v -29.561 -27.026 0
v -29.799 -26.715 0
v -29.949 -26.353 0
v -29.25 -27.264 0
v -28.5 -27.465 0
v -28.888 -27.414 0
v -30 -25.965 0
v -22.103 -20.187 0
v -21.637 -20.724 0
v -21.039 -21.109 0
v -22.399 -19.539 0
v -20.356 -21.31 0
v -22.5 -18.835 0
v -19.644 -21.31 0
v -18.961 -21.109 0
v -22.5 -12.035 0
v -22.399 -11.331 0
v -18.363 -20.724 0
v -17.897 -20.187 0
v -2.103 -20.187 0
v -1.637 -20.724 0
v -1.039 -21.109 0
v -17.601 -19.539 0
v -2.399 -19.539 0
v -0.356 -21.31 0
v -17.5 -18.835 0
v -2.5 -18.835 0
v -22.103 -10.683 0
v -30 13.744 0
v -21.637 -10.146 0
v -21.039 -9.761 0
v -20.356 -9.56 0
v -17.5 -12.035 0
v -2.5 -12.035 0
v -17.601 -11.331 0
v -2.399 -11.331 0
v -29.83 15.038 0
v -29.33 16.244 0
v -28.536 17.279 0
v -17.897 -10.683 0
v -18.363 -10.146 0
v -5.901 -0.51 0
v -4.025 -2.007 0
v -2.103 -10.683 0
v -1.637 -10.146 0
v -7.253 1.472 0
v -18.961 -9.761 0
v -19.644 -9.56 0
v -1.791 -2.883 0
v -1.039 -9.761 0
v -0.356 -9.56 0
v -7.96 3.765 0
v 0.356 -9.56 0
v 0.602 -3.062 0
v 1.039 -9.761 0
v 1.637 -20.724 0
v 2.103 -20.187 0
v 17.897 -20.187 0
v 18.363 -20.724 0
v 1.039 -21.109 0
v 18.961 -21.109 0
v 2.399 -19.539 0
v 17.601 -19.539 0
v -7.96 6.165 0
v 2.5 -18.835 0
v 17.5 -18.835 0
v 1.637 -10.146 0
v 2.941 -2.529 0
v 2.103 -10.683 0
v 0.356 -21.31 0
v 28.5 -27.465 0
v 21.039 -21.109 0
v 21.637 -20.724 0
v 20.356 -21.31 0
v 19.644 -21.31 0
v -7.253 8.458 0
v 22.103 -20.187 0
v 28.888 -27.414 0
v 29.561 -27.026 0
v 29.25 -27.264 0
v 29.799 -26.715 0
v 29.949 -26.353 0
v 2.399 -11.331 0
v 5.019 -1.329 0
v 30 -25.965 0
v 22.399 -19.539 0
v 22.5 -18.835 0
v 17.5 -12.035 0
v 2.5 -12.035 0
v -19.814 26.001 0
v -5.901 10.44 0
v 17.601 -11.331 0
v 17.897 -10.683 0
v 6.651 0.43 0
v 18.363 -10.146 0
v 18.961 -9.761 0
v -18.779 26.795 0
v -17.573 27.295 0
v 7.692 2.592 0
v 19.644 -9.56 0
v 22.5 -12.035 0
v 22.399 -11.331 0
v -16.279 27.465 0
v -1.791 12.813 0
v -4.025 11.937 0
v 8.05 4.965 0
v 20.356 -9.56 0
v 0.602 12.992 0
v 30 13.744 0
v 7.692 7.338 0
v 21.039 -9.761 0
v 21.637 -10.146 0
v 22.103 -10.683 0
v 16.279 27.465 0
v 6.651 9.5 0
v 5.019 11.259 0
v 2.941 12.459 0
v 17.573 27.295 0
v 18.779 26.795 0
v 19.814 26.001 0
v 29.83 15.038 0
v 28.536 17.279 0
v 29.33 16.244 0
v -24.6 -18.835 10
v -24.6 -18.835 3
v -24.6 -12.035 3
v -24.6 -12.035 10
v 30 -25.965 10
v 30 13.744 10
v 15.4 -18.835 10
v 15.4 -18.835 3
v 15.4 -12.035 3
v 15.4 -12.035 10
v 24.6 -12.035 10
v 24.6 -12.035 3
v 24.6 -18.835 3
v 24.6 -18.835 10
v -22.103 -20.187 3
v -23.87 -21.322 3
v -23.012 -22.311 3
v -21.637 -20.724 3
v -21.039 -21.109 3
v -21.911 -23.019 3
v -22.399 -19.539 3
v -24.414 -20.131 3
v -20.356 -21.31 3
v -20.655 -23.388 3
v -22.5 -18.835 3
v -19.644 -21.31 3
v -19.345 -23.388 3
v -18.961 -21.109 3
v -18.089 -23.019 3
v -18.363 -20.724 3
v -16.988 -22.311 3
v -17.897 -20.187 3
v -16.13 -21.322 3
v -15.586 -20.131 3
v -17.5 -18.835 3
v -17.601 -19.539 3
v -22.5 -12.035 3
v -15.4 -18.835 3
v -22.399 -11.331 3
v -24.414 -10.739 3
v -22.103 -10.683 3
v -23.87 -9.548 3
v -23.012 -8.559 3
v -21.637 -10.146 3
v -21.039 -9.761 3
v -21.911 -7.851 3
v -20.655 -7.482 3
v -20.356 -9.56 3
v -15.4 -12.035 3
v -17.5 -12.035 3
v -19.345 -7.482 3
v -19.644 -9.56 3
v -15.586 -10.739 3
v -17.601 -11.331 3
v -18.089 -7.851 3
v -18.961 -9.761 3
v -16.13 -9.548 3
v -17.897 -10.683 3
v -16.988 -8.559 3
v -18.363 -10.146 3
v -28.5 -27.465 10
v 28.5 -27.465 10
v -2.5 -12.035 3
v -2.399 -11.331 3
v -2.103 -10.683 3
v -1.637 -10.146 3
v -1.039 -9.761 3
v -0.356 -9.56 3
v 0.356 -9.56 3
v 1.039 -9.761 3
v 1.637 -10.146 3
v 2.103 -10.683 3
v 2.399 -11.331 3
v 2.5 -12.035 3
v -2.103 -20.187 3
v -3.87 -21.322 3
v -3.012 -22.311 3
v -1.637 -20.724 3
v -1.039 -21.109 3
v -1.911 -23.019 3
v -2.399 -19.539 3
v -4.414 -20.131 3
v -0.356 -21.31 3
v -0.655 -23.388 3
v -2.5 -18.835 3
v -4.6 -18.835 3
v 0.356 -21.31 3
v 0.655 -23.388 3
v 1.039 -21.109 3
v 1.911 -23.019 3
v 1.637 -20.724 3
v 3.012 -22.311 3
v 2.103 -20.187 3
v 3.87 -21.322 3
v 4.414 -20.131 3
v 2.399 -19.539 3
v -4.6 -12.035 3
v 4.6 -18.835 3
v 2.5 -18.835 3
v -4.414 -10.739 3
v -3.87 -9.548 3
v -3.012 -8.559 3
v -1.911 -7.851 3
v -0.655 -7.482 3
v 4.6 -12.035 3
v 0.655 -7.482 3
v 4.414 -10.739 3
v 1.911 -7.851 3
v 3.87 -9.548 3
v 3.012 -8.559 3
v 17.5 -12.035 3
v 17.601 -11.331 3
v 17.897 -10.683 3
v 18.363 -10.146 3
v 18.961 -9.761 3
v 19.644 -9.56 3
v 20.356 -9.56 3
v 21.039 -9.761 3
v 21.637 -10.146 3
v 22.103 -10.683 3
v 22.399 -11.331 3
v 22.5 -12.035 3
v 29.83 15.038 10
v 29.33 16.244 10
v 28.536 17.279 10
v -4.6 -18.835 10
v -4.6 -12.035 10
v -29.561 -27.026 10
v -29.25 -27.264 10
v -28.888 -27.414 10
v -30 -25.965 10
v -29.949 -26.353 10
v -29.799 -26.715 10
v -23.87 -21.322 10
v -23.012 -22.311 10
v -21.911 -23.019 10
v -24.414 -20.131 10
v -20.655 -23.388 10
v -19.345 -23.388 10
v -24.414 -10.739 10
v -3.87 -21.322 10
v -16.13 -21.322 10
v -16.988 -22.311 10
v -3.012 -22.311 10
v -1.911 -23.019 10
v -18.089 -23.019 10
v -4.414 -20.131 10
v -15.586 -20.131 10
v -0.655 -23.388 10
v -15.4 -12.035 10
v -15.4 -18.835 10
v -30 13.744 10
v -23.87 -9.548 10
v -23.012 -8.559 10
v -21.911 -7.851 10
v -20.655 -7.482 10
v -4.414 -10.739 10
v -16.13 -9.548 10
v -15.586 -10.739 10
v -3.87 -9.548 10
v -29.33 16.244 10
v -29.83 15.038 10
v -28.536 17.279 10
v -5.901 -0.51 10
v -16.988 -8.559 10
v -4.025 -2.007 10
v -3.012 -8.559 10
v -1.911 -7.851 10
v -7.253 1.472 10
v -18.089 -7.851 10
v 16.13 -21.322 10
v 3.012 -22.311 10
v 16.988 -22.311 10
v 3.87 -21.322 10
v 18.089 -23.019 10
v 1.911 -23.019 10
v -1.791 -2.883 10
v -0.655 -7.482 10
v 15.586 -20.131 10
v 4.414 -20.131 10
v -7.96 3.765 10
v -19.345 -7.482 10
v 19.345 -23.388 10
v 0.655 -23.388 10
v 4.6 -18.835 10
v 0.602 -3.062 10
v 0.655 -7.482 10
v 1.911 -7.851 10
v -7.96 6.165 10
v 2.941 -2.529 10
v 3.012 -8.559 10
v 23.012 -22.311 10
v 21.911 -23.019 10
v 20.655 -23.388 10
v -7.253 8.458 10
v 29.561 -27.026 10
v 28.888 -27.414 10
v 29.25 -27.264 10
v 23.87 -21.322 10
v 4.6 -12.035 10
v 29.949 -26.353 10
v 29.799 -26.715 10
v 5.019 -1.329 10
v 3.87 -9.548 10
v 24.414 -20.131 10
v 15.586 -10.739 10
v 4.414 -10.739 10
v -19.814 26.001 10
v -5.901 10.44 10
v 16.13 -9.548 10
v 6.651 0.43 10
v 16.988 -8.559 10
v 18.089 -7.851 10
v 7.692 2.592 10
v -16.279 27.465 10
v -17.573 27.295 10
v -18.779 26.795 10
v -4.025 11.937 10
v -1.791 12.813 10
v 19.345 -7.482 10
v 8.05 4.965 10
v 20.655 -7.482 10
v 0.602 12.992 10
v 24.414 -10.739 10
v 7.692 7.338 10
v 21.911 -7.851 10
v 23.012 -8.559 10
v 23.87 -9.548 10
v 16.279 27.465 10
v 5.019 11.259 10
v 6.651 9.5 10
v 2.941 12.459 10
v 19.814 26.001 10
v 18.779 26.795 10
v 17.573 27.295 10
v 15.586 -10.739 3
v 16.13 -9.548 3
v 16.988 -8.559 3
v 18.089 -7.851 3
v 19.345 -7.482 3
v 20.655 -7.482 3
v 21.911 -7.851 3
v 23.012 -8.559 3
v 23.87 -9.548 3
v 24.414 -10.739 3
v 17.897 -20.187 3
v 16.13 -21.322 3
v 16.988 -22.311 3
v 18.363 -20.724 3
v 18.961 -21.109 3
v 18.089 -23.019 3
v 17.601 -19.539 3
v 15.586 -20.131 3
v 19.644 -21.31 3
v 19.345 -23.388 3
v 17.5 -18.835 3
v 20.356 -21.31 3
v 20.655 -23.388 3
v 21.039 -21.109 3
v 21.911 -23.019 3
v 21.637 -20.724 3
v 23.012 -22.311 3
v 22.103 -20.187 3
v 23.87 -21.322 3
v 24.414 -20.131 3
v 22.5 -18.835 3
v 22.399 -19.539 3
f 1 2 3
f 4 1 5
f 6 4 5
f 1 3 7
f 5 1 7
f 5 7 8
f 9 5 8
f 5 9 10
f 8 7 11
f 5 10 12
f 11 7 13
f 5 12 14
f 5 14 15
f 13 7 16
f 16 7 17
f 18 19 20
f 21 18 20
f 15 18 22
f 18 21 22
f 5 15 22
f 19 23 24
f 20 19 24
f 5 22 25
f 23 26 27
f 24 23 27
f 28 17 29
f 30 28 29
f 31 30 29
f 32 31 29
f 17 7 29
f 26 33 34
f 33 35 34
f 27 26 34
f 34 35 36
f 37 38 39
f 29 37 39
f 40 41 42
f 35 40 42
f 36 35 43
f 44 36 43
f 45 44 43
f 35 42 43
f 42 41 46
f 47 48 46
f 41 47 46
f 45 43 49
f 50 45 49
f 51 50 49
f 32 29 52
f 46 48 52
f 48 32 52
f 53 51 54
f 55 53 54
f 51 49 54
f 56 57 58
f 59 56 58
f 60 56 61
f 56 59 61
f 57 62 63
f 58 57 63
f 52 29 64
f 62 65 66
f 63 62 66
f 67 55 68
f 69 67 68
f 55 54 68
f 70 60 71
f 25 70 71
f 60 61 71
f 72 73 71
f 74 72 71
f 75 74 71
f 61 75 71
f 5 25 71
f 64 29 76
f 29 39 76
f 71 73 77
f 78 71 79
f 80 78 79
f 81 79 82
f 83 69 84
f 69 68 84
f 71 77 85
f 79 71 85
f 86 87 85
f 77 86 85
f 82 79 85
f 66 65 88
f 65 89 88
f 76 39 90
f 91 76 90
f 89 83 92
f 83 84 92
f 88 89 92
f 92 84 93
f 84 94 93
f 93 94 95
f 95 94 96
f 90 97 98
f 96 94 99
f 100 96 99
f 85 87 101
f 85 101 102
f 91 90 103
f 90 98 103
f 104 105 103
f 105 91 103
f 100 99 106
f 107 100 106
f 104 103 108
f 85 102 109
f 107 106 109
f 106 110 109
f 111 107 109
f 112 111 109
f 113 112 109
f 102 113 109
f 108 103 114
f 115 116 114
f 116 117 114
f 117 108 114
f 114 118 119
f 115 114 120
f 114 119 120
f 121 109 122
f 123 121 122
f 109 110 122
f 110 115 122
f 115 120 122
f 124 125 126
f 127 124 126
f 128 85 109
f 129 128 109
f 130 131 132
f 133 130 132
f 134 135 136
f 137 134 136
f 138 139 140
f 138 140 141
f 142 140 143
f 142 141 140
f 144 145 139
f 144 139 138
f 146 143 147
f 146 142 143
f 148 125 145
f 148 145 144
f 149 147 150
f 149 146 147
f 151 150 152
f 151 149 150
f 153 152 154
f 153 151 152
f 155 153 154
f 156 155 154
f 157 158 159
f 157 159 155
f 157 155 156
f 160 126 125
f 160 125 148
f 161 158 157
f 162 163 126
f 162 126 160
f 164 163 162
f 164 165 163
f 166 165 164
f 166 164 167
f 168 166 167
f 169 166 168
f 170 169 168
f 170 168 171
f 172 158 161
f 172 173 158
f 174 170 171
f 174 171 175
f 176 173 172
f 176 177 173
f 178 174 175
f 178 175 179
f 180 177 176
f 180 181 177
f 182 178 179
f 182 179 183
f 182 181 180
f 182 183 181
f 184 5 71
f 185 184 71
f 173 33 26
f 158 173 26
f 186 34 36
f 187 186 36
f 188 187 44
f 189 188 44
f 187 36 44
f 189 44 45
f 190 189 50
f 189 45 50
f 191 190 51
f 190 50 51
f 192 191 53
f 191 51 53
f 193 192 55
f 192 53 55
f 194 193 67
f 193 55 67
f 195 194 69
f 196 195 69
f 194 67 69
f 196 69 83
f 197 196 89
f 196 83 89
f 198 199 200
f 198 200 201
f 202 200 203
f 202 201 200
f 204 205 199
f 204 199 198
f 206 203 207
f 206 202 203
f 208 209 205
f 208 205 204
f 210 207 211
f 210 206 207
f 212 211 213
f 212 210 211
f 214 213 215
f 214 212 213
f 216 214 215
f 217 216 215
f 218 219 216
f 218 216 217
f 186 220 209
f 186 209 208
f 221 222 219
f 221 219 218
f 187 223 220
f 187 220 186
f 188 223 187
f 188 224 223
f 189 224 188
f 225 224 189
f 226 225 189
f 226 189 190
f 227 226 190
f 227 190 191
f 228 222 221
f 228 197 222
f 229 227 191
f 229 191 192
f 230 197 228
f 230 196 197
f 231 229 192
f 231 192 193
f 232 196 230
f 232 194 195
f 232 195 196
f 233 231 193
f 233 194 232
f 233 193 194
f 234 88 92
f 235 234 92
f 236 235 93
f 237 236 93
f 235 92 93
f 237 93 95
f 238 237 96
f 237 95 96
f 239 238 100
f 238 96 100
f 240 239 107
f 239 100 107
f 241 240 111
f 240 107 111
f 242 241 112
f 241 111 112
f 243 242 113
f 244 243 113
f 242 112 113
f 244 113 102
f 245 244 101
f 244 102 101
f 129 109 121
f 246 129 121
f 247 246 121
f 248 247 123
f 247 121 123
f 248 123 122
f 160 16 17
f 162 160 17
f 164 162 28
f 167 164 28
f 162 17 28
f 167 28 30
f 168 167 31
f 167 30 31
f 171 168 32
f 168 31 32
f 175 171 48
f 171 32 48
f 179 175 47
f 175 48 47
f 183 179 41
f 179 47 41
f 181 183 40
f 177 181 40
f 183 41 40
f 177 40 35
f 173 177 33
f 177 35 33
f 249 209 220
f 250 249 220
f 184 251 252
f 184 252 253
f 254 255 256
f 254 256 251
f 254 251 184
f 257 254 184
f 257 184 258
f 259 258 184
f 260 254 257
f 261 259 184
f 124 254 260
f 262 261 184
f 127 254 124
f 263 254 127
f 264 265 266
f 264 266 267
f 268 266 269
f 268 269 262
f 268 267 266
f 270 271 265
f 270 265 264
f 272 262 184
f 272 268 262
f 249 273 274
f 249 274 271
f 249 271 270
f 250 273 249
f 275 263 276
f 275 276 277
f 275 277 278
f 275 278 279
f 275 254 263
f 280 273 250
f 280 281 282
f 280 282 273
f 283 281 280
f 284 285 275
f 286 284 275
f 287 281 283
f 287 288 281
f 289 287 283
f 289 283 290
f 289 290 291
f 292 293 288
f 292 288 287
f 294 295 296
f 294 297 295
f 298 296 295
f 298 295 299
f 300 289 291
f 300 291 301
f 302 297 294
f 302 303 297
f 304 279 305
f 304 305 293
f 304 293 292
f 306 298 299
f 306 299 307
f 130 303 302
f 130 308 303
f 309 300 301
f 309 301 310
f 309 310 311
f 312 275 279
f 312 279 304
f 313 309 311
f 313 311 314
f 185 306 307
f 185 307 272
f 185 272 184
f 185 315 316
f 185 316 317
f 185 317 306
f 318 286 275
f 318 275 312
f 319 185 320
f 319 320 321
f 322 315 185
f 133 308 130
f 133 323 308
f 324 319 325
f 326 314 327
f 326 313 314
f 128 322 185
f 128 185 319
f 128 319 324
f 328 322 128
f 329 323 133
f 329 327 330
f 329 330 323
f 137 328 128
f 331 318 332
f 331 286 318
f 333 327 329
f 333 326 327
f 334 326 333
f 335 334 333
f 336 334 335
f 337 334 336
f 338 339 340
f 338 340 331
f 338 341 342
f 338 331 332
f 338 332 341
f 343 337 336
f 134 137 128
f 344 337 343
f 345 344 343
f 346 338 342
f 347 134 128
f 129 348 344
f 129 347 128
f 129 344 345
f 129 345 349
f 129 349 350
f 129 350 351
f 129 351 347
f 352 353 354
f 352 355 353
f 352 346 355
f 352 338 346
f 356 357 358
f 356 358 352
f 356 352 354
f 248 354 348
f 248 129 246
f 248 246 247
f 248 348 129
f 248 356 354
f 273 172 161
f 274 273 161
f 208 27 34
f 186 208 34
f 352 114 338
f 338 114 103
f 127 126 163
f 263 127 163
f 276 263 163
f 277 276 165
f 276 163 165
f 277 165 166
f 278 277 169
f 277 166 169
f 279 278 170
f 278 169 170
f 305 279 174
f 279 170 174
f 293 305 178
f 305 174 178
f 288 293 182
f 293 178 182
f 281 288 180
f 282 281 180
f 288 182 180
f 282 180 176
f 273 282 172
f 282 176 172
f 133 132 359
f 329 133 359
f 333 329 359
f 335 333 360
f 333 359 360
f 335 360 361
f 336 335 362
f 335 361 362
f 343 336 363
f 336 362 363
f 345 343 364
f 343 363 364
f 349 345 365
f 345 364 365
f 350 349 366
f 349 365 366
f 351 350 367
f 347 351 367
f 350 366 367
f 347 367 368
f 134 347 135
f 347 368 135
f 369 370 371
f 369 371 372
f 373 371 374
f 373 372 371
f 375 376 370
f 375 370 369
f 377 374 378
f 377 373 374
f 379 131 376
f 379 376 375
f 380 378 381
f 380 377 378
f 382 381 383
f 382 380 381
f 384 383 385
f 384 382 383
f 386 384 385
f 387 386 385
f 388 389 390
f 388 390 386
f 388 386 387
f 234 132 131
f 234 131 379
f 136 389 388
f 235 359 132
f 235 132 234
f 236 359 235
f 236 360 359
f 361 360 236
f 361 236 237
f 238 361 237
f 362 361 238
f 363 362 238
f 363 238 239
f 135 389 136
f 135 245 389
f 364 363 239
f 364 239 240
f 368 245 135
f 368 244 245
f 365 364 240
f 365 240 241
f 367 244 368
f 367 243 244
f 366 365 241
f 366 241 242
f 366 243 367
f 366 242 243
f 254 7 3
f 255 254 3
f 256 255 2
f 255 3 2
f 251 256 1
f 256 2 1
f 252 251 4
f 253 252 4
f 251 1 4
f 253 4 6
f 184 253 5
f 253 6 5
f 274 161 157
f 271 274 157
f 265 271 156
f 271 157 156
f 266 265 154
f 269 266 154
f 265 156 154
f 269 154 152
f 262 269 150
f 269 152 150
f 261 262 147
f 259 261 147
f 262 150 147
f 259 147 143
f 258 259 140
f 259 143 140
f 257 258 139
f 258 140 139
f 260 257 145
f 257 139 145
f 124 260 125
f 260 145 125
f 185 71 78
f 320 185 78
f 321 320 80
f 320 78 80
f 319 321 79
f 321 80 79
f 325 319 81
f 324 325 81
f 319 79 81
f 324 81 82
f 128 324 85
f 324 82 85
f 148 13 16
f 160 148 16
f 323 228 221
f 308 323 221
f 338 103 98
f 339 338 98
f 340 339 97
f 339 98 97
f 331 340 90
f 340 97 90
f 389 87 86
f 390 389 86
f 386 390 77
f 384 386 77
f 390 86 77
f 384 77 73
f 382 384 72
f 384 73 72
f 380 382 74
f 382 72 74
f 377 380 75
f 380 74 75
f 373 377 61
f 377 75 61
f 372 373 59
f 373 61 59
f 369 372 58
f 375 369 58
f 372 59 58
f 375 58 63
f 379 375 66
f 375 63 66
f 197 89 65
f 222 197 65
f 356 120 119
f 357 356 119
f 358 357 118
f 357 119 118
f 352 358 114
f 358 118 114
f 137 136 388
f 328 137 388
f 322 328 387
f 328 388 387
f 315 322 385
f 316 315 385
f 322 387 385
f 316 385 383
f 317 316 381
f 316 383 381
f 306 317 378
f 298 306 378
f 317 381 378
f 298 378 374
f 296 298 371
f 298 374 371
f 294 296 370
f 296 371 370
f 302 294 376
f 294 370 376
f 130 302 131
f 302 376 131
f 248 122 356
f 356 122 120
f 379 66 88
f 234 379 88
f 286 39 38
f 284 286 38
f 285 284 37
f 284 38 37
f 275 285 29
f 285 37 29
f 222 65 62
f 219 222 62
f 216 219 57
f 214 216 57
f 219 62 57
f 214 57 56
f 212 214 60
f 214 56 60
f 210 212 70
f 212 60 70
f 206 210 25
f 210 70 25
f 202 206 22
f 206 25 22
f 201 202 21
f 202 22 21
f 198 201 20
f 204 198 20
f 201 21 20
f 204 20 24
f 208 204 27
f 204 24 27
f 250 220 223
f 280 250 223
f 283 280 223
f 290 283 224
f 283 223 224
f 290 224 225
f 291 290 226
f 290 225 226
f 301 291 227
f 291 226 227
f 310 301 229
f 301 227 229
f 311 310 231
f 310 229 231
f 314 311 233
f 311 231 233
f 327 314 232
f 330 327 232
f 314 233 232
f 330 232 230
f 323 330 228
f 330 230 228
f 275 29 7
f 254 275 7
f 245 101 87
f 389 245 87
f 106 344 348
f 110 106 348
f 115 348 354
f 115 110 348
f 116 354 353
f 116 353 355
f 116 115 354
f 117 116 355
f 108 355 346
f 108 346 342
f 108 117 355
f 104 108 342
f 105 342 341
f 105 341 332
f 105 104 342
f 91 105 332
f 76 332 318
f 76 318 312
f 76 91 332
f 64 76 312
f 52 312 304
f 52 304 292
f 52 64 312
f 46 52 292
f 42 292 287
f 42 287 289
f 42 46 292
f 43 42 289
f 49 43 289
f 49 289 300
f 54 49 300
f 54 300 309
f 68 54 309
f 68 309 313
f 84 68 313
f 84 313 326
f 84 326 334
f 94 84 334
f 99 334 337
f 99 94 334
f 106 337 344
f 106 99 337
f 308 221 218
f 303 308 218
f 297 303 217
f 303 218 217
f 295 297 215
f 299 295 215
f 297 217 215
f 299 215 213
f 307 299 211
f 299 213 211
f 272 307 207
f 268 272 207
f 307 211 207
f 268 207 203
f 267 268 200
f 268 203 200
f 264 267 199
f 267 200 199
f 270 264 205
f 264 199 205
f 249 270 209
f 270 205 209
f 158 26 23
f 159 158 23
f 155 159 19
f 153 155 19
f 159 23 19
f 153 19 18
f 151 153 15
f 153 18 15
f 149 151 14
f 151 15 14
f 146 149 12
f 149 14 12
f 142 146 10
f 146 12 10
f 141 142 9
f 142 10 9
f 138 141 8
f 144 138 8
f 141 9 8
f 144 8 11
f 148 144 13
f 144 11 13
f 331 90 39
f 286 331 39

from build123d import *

# Parameters (mm, degrees)
F0_R     = 8.05
F1_DEPTH = 10
F2_DEPTH = 3


# Not quite as in the source:
# - ends of sketch curves that miss each other by under 0.0002 mm in the source are joined


with BuildPart() as f1:
    # F0 (on Top) → F1 (new body)
    with BuildSketch(Plane.XY):
        with BuildLine():
            ThreePointArc((-16.278933, 27.465), (-18.1923501618, 27.0843976626), (-19.8144669059, 26.0005339059))
            Line((-19.8144669059, 26.0005339059), (-28.535534, 17.279466))
            ThreePointArc((-28.535534, 17.279466), (-29.6193976626, 15.6573491618), (-30, 13.743932))
            Line((-30, 13.743932), (-30, -25.965))
            ThreePointArc((-30, -25.965), (-29.5606601718, -27.0256601718), (-28.5, -27.465))
            Line((-28.5, -27.465), (28.5, -27.465))
            ThreePointArc((28.5, -27.465), (29.5606601718, -27.0256601718), (30, -25.965))
            Line((30, -25.965), (30, 13.743932))
            ThreePointArc((30, 13.743932), (29.6193976626, 15.6573491618), (28.5355339059, 17.2794659059))
            Line((28.5355339059, 17.2794659059), (19.814466, 26.000533))
            ThreePointArc((19.814466, 26.000533), (18.1923494885, 27.0843975273), (16.278932, 27.465))
            Line((16.278932, 27.465), (-16.278933, 27.465))
        make_face()
        with BuildLine():
            ThreePointArc((-24.6, -12.035), (-20, -7.435), (-15.4, -12.035))
            Line((-15.4, -12.035), (-15.4, -18.835))
            ThreePointArc((-15.4, -18.835), (-20, -23.435), (-24.6, -18.835))
            Line((-24.6, -18.835), (-24.6, -12.035))
        make_face(mode=Mode.SUBTRACT)
        with BuildLine():
            ThreePointArc((4.6, -18.835), (0, -23.435), (-4.6, -18.835))
            Line((-4.6, -18.835), (-4.6, -12.035))
            ThreePointArc((-4.6, -12.035), (0, -7.435), (4.6, -12.035))
            Line((4.6, -12.035), (4.6, -18.835))
        make_face(mode=Mode.SUBTRACT)
        with BuildLine():
            ThreePointArc((15.4, -12.035), (20, -7.435), (24.6, -12.035))
            Line((24.6, -12.035), (24.6, -18.835))
            ThreePointArc((24.6, -18.835), (20, -23.435), (15.4, -18.835))
            Line((15.4, -18.835), (15.4, -12.035))
        make_face(mode=Mode.SUBTRACT)
        with Locations((0, 4.965)):
            Circle(F0_R, mode=Mode.SUBTRACT)
    extrude(amount=F1_DEPTH)

    # F0 (on Top) → F2 (join)
    with BuildSketch(Plane.XY):
        with BuildLine():
            Line((-15.4, -18.835), (-15.4, -12.035))
            ThreePointArc((-15.4, -12.035), (-20, -7.435), (-24.6, -12.035))
            Line((-24.6, -12.035), (-24.6, -18.835))
            ThreePointArc((-24.6, -18.835), (-20, -23.435), (-15.4, -18.835))
        make_face()
        with BuildLine():
            ThreePointArc((-17.5, -18.835), (-20, -21.335), (-22.5, -18.835))
            Line((-22.5, -18.835), (-22.5, -12.035))
            ThreePointArc((-22.5, -12.035), (-20, -9.535), (-17.5, -12.035))
            Line((-17.5, -12.035), (-17.5, -18.835))
        make_face(mode=Mode.SUBTRACT)
        with BuildLine():
            Line((-4.6, -12.035), (-4.6, -18.835))
            ThreePointArc((-4.6, -18.835), (0, -23.435), (4.6, -18.835))
            Line((4.6, -18.835), (4.6, -12.035))
            ThreePointArc((4.6, -12.035), (0, -7.435), (-4.6, -12.035))
        make_face()
        with BuildLine():
            ThreePointArc((2.5, -18.835), (0, -21.335), (-2.5, -18.835))
            Line((-2.5, -18.835), (-2.5, -12.035))
            ThreePointArc((-2.5, -12.035), (0, -9.535), (2.5, -12.035))
            Line((2.5, -12.035), (2.5, -18.835))
        make_face(mode=Mode.SUBTRACT)
        with BuildLine():
            Line((24.6, -18.835), (24.6, -12.035))
            ThreePointArc((24.6, -12.035), (20, -7.435), (15.4, -12.035))
            Line((15.4, -12.035), (15.4, -18.835))
            ThreePointArc((15.4, -18.835), (20, -23.435), (24.6, -18.835))
        make_face()
        with BuildLine():
            ThreePointArc((22.5, -18.835), (20, -21.335), (17.5, -18.835))
            Line((17.5, -18.835), (17.5, -12.035))
            ThreePointArc((17.5, -12.035), (20, -9.535), (22.5, -12.035))
            Line((22.5, -12.035), (22.5, -18.835))
        make_face(mode=Mode.SUBTRACT)
    extrude(amount=F2_DEPTH)


solid = f1.part
